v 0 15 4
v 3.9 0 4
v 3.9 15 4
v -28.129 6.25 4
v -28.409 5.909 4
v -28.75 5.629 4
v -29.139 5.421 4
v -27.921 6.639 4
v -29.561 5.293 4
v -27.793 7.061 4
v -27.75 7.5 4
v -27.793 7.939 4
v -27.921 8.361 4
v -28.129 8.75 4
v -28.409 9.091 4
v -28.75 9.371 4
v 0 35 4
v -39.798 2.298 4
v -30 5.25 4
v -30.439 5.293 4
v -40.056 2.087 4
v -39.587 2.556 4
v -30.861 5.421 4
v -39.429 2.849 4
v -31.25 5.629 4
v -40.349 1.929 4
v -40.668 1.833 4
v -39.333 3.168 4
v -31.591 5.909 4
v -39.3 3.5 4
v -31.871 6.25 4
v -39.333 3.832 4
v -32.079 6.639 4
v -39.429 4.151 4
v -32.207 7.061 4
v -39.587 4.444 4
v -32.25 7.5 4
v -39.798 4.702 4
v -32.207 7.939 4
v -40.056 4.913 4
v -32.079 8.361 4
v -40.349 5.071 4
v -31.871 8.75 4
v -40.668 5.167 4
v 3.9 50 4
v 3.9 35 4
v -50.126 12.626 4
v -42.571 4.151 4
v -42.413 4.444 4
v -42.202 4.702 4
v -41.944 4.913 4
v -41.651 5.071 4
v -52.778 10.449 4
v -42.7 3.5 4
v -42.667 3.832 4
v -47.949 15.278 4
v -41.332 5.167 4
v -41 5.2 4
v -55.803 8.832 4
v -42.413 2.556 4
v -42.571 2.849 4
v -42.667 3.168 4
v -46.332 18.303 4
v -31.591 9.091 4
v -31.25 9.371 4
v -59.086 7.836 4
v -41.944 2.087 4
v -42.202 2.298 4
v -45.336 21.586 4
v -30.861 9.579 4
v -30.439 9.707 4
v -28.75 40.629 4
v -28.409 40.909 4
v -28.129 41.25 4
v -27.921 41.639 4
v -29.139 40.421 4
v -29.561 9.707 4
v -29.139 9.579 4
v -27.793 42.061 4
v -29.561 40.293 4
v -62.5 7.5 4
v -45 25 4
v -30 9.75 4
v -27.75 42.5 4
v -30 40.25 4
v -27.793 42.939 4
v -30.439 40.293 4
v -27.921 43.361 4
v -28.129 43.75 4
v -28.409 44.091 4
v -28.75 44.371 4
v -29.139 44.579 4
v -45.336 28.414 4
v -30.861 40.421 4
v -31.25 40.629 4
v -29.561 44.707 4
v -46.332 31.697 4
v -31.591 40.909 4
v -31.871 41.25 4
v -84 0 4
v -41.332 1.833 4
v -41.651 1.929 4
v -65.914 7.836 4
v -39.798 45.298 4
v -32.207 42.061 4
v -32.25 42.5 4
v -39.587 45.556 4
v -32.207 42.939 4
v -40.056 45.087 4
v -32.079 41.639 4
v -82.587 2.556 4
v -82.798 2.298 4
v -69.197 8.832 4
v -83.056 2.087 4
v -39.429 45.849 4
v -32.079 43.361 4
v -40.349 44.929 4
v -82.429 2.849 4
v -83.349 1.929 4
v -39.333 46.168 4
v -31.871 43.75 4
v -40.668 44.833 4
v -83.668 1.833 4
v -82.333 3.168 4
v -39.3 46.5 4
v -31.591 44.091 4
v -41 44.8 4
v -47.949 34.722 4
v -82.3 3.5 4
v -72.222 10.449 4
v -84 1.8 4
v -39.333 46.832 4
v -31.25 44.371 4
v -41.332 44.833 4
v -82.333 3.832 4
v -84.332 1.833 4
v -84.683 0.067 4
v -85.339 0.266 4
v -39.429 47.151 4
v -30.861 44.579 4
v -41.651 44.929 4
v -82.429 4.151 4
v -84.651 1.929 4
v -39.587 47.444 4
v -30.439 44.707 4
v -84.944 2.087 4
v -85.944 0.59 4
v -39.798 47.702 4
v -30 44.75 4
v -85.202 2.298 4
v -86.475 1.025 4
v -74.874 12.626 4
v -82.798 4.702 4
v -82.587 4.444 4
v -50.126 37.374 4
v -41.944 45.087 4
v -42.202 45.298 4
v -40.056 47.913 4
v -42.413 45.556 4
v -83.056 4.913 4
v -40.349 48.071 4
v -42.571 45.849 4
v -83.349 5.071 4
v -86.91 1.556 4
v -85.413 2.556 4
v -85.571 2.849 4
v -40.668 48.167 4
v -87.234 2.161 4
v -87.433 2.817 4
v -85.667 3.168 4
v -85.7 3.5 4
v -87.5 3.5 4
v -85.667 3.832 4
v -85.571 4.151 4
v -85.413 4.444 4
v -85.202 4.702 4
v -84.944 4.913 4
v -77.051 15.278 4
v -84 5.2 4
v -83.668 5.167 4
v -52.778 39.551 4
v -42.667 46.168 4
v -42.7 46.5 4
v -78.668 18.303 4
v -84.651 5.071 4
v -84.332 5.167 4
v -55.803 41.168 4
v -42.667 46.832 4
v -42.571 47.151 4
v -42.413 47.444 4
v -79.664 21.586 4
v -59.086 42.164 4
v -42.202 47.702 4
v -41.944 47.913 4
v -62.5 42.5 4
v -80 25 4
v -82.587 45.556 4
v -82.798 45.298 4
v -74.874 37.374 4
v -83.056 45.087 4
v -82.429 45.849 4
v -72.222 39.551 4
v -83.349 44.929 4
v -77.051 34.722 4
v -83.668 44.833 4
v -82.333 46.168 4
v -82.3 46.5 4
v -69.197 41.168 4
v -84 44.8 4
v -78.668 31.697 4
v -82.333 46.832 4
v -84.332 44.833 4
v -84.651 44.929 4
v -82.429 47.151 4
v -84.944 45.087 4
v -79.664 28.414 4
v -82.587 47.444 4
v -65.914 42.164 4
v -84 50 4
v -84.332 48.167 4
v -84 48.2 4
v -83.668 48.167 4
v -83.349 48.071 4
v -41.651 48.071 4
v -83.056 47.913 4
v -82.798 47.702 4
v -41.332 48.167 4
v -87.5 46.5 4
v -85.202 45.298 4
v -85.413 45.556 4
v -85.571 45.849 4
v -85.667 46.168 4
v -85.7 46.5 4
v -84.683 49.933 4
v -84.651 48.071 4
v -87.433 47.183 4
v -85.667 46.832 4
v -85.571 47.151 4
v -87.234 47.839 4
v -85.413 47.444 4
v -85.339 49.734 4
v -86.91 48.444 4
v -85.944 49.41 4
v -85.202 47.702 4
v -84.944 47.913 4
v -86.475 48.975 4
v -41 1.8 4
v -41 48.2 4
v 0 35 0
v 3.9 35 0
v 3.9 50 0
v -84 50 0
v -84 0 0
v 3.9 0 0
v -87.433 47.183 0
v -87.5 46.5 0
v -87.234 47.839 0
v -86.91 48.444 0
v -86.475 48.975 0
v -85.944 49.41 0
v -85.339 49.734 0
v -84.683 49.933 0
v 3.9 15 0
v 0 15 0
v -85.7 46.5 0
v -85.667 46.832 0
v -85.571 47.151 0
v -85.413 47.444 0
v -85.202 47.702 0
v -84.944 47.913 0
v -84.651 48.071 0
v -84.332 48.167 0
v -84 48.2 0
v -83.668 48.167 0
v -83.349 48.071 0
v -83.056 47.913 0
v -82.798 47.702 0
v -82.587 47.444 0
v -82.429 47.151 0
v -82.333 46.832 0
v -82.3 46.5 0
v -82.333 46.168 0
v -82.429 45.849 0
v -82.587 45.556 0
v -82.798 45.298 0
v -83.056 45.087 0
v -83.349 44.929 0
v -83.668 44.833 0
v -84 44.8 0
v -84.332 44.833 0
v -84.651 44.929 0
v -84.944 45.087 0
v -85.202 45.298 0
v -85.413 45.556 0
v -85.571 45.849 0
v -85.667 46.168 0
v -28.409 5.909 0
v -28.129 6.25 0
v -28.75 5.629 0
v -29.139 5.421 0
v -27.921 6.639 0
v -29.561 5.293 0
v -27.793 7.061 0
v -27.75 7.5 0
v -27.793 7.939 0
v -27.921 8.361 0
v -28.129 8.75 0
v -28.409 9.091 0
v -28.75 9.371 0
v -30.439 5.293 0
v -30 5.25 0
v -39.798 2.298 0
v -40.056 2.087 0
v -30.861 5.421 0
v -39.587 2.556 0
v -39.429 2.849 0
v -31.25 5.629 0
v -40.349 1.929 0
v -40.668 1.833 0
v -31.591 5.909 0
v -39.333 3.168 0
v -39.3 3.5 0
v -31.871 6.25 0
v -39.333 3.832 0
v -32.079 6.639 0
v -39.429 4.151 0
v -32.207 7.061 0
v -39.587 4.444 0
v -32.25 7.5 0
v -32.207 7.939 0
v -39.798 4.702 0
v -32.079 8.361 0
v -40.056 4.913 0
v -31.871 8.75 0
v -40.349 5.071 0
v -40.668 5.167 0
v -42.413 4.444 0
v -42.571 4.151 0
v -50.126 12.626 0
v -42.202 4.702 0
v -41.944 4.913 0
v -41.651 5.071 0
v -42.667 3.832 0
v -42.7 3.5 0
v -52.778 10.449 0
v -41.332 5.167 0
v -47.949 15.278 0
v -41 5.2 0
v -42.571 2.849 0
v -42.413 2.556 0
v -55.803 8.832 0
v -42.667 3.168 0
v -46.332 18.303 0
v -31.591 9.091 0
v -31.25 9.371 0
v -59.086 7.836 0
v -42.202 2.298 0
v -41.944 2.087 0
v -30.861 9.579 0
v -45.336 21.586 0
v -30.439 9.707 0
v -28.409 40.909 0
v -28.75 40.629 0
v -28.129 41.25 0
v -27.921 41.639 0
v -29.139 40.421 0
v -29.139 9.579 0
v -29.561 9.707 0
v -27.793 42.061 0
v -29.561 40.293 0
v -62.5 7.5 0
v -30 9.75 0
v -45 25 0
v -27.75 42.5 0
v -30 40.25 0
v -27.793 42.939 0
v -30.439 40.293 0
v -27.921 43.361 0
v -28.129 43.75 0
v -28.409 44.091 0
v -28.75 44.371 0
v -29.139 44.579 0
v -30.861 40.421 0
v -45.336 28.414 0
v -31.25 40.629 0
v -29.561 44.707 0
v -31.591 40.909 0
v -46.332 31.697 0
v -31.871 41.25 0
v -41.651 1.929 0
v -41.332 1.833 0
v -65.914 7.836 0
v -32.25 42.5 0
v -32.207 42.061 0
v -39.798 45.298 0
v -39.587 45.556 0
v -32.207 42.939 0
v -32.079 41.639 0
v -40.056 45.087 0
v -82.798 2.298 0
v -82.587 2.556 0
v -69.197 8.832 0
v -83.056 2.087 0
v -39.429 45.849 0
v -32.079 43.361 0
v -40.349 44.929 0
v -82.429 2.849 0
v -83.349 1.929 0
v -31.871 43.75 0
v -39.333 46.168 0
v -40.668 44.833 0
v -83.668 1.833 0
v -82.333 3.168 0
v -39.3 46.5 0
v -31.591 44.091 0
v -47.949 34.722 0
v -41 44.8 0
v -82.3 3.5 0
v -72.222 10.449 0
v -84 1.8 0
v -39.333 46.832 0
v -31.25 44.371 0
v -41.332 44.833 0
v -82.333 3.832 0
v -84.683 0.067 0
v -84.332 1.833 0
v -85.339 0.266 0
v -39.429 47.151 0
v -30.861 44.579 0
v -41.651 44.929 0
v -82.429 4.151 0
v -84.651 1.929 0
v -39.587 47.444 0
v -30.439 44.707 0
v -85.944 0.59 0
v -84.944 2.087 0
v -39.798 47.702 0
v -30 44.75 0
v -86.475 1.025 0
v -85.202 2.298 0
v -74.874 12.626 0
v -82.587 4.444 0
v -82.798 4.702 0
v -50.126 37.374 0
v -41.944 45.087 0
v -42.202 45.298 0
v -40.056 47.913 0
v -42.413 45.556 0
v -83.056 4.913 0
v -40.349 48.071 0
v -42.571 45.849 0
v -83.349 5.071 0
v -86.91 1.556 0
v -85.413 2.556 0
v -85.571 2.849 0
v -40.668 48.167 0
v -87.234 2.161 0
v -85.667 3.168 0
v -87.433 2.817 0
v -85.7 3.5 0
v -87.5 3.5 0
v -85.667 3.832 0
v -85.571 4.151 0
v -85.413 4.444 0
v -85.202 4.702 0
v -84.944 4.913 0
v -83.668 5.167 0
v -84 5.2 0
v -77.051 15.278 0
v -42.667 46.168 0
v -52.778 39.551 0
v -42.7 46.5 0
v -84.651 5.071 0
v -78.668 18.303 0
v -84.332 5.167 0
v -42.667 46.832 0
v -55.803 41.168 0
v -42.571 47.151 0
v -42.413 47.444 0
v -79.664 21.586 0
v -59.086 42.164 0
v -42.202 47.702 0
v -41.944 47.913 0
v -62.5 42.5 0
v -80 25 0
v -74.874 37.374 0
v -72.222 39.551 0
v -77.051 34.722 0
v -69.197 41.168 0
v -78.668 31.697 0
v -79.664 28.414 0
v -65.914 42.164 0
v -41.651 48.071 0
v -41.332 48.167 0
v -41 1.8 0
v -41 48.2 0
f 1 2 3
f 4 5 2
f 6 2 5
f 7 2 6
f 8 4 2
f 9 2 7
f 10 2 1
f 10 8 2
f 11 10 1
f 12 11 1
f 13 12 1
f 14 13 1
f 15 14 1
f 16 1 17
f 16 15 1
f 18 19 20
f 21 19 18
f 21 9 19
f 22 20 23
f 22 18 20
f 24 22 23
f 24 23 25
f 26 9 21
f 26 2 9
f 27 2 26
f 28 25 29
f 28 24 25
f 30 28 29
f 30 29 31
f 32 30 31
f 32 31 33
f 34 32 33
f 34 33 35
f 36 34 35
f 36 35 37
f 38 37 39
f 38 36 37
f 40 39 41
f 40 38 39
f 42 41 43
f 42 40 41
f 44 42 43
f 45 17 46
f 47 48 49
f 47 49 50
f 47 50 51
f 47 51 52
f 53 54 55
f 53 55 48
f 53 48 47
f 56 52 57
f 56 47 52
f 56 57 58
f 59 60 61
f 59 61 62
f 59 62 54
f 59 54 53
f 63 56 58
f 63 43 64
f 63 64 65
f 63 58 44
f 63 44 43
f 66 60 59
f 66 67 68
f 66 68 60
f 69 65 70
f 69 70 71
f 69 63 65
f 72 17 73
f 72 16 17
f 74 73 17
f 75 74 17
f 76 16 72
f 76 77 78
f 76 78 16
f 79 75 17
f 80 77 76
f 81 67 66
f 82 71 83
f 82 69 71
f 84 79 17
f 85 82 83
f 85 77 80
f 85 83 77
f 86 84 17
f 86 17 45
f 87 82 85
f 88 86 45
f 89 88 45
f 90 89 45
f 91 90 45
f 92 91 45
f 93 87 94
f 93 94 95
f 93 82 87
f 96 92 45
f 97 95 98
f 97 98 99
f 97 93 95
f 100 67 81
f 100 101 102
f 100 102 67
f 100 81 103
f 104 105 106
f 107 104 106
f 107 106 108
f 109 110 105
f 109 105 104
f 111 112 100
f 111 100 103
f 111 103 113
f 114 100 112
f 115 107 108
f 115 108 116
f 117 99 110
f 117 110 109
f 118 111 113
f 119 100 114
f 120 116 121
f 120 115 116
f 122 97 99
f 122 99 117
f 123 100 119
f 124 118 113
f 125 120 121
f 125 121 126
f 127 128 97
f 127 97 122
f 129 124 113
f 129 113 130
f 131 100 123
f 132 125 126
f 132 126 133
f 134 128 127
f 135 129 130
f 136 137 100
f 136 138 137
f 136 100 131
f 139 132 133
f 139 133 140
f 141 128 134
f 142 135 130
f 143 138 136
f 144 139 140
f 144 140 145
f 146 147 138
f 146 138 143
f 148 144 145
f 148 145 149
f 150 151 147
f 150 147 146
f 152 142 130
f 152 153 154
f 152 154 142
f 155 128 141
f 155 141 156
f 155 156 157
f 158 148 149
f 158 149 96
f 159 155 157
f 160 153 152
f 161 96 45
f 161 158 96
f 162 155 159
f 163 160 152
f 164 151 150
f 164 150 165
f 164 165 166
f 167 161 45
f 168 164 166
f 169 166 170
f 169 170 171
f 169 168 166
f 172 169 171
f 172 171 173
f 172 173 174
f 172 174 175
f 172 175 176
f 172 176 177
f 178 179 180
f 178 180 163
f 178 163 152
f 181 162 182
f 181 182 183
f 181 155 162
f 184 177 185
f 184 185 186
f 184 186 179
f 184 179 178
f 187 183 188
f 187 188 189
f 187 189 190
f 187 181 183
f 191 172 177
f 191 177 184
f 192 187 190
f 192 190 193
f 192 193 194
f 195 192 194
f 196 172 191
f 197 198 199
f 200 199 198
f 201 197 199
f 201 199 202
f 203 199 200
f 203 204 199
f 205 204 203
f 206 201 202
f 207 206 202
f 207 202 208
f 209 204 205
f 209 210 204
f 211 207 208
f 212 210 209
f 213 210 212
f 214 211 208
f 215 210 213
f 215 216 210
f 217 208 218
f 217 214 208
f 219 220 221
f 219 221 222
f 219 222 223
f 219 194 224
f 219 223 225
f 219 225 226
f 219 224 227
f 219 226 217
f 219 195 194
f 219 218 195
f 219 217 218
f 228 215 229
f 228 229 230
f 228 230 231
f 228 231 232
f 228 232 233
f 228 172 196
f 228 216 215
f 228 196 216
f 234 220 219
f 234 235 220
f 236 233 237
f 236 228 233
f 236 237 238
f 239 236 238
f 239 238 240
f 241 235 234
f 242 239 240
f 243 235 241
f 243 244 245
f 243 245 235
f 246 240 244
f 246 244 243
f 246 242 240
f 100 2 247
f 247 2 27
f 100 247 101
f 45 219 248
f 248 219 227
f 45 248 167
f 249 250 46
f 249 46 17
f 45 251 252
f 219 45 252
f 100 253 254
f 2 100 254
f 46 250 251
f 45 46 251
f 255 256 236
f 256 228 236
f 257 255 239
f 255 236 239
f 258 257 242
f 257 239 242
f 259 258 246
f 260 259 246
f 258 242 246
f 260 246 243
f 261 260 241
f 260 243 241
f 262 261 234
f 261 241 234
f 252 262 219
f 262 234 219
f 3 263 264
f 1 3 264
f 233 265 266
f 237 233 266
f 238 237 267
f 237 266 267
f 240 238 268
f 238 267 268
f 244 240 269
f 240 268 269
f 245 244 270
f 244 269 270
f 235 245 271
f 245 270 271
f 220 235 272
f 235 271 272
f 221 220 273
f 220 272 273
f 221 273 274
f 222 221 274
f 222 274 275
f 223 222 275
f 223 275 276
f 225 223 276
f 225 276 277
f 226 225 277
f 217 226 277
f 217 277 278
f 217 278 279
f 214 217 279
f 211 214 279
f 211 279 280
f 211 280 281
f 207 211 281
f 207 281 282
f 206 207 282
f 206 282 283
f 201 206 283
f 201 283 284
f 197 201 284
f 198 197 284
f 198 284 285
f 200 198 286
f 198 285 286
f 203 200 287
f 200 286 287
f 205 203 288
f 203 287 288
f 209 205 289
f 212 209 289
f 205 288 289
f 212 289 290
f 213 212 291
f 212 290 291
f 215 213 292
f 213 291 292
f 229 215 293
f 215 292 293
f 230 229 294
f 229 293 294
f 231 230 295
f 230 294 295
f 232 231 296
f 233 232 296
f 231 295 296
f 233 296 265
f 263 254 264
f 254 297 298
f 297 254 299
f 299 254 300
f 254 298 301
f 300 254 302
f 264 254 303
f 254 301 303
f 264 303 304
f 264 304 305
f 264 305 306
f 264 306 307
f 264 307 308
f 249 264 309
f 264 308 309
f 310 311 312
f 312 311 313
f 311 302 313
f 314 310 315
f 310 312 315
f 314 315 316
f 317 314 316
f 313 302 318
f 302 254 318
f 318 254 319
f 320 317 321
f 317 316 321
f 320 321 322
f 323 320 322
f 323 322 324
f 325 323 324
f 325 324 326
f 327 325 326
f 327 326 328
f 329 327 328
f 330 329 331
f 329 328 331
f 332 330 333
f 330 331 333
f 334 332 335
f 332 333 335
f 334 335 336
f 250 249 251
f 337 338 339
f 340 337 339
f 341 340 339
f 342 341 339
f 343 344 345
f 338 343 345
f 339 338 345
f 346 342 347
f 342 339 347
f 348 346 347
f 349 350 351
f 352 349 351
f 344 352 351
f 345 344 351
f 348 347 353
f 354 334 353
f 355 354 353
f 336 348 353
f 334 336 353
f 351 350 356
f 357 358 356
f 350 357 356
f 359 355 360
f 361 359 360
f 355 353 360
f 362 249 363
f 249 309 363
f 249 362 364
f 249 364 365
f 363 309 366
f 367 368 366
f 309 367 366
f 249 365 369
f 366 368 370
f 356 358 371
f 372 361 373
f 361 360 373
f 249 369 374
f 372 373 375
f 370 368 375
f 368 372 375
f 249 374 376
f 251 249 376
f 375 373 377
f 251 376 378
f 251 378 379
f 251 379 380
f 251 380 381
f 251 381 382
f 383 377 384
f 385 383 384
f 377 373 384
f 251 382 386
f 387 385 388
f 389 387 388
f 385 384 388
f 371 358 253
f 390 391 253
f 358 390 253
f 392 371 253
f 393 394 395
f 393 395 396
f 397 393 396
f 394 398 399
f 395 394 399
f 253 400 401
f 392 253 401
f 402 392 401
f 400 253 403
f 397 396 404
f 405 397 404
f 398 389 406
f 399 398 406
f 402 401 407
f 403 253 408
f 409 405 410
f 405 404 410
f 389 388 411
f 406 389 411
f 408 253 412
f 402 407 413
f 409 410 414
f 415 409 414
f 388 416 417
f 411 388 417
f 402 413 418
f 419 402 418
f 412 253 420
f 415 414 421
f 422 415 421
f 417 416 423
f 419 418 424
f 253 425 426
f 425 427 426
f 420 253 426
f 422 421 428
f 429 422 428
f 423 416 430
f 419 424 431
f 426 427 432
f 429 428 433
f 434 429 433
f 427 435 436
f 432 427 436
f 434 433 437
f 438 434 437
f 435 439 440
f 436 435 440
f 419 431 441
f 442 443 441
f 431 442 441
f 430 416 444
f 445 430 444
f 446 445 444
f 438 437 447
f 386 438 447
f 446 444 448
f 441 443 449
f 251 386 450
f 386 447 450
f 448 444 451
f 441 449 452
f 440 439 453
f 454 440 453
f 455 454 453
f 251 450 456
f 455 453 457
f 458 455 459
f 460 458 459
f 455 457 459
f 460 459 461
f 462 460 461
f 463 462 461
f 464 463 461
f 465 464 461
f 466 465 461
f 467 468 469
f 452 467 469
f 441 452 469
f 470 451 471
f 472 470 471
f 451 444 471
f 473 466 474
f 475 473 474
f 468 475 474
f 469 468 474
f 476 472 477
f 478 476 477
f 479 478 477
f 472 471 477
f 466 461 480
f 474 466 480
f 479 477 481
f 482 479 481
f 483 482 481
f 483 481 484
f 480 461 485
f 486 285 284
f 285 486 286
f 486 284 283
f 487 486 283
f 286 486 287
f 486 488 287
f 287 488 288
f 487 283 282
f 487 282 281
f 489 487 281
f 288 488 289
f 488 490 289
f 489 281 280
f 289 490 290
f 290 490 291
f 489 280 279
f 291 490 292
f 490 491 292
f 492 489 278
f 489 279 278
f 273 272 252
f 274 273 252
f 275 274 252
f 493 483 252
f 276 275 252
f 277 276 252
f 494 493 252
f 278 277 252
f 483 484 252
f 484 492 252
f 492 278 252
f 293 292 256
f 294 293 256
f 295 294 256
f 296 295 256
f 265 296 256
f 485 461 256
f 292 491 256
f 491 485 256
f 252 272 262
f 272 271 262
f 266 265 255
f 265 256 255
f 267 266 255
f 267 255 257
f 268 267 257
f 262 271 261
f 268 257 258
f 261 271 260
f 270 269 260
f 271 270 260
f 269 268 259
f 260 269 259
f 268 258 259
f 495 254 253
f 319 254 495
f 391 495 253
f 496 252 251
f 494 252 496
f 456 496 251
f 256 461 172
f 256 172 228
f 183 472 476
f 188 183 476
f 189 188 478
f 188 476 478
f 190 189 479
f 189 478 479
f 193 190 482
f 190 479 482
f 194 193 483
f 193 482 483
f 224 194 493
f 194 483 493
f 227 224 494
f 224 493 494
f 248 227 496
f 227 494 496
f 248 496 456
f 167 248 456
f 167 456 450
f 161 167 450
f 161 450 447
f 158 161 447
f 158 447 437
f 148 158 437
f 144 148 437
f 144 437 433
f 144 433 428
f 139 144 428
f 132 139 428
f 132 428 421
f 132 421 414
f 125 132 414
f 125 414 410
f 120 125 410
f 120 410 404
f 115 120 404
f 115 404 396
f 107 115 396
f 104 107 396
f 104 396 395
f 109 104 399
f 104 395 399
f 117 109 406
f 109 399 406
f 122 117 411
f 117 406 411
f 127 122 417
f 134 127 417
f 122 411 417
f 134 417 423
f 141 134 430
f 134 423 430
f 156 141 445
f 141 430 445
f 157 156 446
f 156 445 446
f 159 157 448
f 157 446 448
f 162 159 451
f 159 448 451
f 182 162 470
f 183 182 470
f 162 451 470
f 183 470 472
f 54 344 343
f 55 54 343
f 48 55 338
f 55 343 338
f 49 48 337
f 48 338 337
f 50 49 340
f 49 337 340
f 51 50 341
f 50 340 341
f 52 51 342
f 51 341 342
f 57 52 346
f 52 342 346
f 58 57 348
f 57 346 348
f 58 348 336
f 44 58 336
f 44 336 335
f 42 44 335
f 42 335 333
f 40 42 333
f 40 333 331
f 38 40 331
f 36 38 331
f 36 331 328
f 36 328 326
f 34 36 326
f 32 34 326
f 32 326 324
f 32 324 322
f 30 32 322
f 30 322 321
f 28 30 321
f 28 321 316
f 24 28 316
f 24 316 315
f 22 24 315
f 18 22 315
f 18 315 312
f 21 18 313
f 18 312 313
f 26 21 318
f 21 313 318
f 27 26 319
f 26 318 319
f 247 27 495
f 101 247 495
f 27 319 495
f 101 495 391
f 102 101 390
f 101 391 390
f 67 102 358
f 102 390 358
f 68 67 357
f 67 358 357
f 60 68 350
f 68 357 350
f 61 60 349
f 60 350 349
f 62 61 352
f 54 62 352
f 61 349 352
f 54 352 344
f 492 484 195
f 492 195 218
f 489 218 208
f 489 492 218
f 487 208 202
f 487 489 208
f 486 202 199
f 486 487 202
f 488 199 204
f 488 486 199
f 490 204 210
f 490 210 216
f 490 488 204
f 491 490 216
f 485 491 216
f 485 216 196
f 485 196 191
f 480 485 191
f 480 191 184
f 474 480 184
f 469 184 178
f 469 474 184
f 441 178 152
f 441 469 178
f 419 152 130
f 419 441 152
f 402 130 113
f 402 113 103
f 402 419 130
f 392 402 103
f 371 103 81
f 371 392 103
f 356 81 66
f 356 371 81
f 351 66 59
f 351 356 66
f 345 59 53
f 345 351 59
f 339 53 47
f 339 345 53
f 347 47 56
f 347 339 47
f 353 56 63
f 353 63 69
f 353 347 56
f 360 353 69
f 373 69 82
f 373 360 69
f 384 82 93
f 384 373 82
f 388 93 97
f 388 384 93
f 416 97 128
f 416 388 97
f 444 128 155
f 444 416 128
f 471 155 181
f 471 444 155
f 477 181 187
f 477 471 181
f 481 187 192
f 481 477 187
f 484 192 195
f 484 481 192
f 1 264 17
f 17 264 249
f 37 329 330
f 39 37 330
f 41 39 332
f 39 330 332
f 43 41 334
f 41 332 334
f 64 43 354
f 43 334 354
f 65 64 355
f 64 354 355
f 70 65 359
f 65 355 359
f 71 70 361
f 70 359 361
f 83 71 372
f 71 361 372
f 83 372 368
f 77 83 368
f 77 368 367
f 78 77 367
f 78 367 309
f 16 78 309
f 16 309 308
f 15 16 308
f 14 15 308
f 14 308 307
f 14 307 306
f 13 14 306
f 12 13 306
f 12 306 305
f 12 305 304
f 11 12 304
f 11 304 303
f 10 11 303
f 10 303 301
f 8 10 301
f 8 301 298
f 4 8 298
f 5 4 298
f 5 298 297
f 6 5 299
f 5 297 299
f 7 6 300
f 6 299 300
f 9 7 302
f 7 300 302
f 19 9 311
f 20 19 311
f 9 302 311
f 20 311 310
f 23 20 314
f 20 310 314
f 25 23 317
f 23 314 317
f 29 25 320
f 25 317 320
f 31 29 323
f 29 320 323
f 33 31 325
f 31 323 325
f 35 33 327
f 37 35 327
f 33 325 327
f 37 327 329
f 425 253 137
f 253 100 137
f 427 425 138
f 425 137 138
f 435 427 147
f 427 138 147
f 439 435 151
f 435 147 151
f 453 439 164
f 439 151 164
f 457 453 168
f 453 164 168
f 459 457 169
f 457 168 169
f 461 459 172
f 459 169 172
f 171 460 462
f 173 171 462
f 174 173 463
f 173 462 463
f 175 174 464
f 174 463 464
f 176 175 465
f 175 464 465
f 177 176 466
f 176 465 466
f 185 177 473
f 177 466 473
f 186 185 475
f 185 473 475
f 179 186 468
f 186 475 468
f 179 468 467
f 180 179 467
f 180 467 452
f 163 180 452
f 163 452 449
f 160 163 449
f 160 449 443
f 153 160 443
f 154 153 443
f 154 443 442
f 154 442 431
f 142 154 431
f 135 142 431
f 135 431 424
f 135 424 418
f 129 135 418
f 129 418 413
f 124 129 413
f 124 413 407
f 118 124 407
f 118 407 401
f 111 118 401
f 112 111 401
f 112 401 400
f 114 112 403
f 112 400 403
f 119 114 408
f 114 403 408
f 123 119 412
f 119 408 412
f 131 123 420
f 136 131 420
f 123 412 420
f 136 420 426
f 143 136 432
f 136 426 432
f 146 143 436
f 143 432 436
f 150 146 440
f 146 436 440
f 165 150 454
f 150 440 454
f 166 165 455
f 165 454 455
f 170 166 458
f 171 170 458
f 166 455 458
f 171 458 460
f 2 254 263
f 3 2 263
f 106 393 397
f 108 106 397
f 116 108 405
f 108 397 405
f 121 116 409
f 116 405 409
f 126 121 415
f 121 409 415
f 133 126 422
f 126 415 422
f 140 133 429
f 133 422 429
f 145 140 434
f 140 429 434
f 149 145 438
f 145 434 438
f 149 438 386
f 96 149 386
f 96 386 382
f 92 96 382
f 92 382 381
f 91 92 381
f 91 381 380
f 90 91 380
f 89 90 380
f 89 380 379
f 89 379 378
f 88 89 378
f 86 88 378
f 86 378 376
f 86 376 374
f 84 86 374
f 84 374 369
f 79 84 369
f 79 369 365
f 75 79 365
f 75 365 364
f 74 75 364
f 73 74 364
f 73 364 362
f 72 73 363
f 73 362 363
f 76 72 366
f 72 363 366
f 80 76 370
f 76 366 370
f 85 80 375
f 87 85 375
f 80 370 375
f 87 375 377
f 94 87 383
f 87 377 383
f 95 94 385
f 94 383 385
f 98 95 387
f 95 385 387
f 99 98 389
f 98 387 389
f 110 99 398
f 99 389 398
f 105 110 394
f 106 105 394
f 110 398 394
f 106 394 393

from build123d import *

# Parameters (mm, degrees)
SKETCH_1_R         = 17.5
EXTRUDE_1_DEPTH    = 4
HOLE_WIZARD_M3_1_D = 3.4
HOLE_WIZARD_M4_1_D = 4.5
FILLET_2_R         = 3.5


with BuildPart() as part:
    # ｽｹｯﾁ1 → ﾎﾞｽ - 押し出し1 (new body)
    with BuildSketch(Plane(origin=(0, 0, 0), x_dir=(0, 1, 0), z_dir=(0, 0, 1))):
        Polygon((0, 87.5), (0, -3.9), (15, -3.9), (15, 0), (35, 0), (35, -3.9), (50, -3.9), (50, 87.5), align=None)
        with Locations((25, 62.5)):
            Circle(SKETCH_1_R, mode=Mode.SUBTRACT)
    extrude(amount=EXTRUDE_1_DEPTH)

    # M3 すきま穴1 (through all)
    with Locations(Plane.XY.offset(4)):
        with Locations((-84, 3.5), (-84, 46.5), (-41, 46.5), (-41, 3.5)):
            Hole(HOLE_WIZARD_M3_1_D / 2)

    # M4 すきま穴1 (through all)
    with Locations(Plane.XY.offset(4)):
        with Locations((-30, 42.5), (-30, 7.5)):
            Hole(HOLE_WIZARD_M4_1_D / 2)

    # ﾌｨﾚｯﾄ2
    fillet_2_edges = [part.edges().sort_by_distance(p)[0] for p in [
        (-87.5, 50, 2),
        (-87.5, 0, 2),
    ]]
    fillet(fillet_2_edges, radius=FILLET_2_R)


solid = part.part
